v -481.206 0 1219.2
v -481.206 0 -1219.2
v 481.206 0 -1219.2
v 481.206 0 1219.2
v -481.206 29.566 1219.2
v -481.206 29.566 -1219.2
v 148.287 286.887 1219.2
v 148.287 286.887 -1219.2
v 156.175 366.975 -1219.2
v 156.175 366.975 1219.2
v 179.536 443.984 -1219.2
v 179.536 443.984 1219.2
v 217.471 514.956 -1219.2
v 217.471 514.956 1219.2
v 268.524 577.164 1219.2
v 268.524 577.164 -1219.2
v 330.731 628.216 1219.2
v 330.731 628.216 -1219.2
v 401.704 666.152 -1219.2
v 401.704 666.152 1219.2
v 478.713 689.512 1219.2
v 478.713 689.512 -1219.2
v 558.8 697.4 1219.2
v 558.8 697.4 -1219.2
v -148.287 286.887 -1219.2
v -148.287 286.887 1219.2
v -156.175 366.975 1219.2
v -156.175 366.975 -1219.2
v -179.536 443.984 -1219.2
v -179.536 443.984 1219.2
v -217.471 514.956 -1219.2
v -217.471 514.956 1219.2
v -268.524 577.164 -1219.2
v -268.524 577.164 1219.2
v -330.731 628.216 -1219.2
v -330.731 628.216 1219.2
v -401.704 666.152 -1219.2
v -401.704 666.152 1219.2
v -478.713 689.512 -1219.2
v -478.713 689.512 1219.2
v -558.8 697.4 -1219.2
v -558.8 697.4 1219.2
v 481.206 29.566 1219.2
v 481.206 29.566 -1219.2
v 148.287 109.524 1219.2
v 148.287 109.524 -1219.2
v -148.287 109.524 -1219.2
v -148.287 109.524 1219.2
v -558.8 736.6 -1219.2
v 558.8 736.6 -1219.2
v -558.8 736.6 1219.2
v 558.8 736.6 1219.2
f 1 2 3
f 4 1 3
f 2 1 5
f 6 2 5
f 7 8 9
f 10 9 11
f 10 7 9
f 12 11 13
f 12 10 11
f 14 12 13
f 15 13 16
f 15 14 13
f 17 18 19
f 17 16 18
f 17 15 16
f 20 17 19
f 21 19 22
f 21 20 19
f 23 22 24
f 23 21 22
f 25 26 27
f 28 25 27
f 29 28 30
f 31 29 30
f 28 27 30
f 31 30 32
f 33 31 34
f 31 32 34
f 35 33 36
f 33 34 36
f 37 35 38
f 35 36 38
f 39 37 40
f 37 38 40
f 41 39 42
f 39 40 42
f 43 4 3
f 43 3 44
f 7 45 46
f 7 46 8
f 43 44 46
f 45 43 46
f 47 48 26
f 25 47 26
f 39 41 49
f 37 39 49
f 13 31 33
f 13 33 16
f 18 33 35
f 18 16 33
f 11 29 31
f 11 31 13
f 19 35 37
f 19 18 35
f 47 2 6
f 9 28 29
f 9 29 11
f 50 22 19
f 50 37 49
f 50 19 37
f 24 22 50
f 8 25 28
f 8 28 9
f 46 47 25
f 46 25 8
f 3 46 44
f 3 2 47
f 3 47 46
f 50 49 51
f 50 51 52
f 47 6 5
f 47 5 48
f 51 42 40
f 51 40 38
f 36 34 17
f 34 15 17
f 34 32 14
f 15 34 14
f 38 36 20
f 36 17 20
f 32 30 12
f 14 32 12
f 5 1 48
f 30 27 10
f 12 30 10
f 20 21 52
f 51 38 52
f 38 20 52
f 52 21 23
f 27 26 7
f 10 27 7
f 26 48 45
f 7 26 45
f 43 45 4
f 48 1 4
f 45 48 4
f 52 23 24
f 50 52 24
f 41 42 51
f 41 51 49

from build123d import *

# Parameters (mm, degrees)
SKETCH2_W           = 1117.6
SKETCH2_H           = 2438.4
BOSS_EXTRUDE1_DEPTH = 736.6
CUT_EXTRUDE1_DEPTH  = 2439.4


with BuildPart() as part:
    # Sketch2 → Boss-Extrude1 (new body)
    with BuildSketch(Plane(origin=(0, 0, 0), x_dir=(1, 0, 0), z_dir=(0, 1, 0))):
        Rectangle(SKETCH2_W, SKETCH2_H)
    extrude(amount=BOSS_EXTRUDE1_DEPTH)

    # Sketch3 → Cut-Extrude1 (cut, through all)
    with BuildSketch(Plane.XY.offset(1219.2)):
        with BuildLine():
            Line((-148.287166209, 109.524357008), (-148.287166209, 286.88743816))
            ThreePointArc((-148.287166209, 286.88743816), (-268.523591462, 577.163846698), (-558.8, 697.400271951))
            Line((-558.8, 697.400271951), (-558.8, 0))
            Line((-558.8, 0), (-481.206392305, 0))
            Line((-481.206392305, 0), (-481.206392305, 29.565590915))
            Line((-481.206392305, 29.565590915), (-148.287166209, 109.524357008))
        make_face()
        with BuildLine():
            Line((558.8, 0), (481.206392305, 0))
            Line((481.206392305, 0), (481.206392305, 29.565590915))
            Line((481.206392305, 29.565590915), (148.287166209, 109.524357008))
            Line((148.287166209, 109.524357008), (148.287166209, 286.88743816))
            ThreePointArc((148.287166209, 286.88743816), (268.523591462, 577.163846698), (558.8, 697.400271951))
            Line((558.8, 697.400271951), (558.8, 0))
        make_face()
    extrude(amount=-CUT_EXTRUDE1_DEPTH, mode=Mode.SUBTRACT)


solid = part.part
